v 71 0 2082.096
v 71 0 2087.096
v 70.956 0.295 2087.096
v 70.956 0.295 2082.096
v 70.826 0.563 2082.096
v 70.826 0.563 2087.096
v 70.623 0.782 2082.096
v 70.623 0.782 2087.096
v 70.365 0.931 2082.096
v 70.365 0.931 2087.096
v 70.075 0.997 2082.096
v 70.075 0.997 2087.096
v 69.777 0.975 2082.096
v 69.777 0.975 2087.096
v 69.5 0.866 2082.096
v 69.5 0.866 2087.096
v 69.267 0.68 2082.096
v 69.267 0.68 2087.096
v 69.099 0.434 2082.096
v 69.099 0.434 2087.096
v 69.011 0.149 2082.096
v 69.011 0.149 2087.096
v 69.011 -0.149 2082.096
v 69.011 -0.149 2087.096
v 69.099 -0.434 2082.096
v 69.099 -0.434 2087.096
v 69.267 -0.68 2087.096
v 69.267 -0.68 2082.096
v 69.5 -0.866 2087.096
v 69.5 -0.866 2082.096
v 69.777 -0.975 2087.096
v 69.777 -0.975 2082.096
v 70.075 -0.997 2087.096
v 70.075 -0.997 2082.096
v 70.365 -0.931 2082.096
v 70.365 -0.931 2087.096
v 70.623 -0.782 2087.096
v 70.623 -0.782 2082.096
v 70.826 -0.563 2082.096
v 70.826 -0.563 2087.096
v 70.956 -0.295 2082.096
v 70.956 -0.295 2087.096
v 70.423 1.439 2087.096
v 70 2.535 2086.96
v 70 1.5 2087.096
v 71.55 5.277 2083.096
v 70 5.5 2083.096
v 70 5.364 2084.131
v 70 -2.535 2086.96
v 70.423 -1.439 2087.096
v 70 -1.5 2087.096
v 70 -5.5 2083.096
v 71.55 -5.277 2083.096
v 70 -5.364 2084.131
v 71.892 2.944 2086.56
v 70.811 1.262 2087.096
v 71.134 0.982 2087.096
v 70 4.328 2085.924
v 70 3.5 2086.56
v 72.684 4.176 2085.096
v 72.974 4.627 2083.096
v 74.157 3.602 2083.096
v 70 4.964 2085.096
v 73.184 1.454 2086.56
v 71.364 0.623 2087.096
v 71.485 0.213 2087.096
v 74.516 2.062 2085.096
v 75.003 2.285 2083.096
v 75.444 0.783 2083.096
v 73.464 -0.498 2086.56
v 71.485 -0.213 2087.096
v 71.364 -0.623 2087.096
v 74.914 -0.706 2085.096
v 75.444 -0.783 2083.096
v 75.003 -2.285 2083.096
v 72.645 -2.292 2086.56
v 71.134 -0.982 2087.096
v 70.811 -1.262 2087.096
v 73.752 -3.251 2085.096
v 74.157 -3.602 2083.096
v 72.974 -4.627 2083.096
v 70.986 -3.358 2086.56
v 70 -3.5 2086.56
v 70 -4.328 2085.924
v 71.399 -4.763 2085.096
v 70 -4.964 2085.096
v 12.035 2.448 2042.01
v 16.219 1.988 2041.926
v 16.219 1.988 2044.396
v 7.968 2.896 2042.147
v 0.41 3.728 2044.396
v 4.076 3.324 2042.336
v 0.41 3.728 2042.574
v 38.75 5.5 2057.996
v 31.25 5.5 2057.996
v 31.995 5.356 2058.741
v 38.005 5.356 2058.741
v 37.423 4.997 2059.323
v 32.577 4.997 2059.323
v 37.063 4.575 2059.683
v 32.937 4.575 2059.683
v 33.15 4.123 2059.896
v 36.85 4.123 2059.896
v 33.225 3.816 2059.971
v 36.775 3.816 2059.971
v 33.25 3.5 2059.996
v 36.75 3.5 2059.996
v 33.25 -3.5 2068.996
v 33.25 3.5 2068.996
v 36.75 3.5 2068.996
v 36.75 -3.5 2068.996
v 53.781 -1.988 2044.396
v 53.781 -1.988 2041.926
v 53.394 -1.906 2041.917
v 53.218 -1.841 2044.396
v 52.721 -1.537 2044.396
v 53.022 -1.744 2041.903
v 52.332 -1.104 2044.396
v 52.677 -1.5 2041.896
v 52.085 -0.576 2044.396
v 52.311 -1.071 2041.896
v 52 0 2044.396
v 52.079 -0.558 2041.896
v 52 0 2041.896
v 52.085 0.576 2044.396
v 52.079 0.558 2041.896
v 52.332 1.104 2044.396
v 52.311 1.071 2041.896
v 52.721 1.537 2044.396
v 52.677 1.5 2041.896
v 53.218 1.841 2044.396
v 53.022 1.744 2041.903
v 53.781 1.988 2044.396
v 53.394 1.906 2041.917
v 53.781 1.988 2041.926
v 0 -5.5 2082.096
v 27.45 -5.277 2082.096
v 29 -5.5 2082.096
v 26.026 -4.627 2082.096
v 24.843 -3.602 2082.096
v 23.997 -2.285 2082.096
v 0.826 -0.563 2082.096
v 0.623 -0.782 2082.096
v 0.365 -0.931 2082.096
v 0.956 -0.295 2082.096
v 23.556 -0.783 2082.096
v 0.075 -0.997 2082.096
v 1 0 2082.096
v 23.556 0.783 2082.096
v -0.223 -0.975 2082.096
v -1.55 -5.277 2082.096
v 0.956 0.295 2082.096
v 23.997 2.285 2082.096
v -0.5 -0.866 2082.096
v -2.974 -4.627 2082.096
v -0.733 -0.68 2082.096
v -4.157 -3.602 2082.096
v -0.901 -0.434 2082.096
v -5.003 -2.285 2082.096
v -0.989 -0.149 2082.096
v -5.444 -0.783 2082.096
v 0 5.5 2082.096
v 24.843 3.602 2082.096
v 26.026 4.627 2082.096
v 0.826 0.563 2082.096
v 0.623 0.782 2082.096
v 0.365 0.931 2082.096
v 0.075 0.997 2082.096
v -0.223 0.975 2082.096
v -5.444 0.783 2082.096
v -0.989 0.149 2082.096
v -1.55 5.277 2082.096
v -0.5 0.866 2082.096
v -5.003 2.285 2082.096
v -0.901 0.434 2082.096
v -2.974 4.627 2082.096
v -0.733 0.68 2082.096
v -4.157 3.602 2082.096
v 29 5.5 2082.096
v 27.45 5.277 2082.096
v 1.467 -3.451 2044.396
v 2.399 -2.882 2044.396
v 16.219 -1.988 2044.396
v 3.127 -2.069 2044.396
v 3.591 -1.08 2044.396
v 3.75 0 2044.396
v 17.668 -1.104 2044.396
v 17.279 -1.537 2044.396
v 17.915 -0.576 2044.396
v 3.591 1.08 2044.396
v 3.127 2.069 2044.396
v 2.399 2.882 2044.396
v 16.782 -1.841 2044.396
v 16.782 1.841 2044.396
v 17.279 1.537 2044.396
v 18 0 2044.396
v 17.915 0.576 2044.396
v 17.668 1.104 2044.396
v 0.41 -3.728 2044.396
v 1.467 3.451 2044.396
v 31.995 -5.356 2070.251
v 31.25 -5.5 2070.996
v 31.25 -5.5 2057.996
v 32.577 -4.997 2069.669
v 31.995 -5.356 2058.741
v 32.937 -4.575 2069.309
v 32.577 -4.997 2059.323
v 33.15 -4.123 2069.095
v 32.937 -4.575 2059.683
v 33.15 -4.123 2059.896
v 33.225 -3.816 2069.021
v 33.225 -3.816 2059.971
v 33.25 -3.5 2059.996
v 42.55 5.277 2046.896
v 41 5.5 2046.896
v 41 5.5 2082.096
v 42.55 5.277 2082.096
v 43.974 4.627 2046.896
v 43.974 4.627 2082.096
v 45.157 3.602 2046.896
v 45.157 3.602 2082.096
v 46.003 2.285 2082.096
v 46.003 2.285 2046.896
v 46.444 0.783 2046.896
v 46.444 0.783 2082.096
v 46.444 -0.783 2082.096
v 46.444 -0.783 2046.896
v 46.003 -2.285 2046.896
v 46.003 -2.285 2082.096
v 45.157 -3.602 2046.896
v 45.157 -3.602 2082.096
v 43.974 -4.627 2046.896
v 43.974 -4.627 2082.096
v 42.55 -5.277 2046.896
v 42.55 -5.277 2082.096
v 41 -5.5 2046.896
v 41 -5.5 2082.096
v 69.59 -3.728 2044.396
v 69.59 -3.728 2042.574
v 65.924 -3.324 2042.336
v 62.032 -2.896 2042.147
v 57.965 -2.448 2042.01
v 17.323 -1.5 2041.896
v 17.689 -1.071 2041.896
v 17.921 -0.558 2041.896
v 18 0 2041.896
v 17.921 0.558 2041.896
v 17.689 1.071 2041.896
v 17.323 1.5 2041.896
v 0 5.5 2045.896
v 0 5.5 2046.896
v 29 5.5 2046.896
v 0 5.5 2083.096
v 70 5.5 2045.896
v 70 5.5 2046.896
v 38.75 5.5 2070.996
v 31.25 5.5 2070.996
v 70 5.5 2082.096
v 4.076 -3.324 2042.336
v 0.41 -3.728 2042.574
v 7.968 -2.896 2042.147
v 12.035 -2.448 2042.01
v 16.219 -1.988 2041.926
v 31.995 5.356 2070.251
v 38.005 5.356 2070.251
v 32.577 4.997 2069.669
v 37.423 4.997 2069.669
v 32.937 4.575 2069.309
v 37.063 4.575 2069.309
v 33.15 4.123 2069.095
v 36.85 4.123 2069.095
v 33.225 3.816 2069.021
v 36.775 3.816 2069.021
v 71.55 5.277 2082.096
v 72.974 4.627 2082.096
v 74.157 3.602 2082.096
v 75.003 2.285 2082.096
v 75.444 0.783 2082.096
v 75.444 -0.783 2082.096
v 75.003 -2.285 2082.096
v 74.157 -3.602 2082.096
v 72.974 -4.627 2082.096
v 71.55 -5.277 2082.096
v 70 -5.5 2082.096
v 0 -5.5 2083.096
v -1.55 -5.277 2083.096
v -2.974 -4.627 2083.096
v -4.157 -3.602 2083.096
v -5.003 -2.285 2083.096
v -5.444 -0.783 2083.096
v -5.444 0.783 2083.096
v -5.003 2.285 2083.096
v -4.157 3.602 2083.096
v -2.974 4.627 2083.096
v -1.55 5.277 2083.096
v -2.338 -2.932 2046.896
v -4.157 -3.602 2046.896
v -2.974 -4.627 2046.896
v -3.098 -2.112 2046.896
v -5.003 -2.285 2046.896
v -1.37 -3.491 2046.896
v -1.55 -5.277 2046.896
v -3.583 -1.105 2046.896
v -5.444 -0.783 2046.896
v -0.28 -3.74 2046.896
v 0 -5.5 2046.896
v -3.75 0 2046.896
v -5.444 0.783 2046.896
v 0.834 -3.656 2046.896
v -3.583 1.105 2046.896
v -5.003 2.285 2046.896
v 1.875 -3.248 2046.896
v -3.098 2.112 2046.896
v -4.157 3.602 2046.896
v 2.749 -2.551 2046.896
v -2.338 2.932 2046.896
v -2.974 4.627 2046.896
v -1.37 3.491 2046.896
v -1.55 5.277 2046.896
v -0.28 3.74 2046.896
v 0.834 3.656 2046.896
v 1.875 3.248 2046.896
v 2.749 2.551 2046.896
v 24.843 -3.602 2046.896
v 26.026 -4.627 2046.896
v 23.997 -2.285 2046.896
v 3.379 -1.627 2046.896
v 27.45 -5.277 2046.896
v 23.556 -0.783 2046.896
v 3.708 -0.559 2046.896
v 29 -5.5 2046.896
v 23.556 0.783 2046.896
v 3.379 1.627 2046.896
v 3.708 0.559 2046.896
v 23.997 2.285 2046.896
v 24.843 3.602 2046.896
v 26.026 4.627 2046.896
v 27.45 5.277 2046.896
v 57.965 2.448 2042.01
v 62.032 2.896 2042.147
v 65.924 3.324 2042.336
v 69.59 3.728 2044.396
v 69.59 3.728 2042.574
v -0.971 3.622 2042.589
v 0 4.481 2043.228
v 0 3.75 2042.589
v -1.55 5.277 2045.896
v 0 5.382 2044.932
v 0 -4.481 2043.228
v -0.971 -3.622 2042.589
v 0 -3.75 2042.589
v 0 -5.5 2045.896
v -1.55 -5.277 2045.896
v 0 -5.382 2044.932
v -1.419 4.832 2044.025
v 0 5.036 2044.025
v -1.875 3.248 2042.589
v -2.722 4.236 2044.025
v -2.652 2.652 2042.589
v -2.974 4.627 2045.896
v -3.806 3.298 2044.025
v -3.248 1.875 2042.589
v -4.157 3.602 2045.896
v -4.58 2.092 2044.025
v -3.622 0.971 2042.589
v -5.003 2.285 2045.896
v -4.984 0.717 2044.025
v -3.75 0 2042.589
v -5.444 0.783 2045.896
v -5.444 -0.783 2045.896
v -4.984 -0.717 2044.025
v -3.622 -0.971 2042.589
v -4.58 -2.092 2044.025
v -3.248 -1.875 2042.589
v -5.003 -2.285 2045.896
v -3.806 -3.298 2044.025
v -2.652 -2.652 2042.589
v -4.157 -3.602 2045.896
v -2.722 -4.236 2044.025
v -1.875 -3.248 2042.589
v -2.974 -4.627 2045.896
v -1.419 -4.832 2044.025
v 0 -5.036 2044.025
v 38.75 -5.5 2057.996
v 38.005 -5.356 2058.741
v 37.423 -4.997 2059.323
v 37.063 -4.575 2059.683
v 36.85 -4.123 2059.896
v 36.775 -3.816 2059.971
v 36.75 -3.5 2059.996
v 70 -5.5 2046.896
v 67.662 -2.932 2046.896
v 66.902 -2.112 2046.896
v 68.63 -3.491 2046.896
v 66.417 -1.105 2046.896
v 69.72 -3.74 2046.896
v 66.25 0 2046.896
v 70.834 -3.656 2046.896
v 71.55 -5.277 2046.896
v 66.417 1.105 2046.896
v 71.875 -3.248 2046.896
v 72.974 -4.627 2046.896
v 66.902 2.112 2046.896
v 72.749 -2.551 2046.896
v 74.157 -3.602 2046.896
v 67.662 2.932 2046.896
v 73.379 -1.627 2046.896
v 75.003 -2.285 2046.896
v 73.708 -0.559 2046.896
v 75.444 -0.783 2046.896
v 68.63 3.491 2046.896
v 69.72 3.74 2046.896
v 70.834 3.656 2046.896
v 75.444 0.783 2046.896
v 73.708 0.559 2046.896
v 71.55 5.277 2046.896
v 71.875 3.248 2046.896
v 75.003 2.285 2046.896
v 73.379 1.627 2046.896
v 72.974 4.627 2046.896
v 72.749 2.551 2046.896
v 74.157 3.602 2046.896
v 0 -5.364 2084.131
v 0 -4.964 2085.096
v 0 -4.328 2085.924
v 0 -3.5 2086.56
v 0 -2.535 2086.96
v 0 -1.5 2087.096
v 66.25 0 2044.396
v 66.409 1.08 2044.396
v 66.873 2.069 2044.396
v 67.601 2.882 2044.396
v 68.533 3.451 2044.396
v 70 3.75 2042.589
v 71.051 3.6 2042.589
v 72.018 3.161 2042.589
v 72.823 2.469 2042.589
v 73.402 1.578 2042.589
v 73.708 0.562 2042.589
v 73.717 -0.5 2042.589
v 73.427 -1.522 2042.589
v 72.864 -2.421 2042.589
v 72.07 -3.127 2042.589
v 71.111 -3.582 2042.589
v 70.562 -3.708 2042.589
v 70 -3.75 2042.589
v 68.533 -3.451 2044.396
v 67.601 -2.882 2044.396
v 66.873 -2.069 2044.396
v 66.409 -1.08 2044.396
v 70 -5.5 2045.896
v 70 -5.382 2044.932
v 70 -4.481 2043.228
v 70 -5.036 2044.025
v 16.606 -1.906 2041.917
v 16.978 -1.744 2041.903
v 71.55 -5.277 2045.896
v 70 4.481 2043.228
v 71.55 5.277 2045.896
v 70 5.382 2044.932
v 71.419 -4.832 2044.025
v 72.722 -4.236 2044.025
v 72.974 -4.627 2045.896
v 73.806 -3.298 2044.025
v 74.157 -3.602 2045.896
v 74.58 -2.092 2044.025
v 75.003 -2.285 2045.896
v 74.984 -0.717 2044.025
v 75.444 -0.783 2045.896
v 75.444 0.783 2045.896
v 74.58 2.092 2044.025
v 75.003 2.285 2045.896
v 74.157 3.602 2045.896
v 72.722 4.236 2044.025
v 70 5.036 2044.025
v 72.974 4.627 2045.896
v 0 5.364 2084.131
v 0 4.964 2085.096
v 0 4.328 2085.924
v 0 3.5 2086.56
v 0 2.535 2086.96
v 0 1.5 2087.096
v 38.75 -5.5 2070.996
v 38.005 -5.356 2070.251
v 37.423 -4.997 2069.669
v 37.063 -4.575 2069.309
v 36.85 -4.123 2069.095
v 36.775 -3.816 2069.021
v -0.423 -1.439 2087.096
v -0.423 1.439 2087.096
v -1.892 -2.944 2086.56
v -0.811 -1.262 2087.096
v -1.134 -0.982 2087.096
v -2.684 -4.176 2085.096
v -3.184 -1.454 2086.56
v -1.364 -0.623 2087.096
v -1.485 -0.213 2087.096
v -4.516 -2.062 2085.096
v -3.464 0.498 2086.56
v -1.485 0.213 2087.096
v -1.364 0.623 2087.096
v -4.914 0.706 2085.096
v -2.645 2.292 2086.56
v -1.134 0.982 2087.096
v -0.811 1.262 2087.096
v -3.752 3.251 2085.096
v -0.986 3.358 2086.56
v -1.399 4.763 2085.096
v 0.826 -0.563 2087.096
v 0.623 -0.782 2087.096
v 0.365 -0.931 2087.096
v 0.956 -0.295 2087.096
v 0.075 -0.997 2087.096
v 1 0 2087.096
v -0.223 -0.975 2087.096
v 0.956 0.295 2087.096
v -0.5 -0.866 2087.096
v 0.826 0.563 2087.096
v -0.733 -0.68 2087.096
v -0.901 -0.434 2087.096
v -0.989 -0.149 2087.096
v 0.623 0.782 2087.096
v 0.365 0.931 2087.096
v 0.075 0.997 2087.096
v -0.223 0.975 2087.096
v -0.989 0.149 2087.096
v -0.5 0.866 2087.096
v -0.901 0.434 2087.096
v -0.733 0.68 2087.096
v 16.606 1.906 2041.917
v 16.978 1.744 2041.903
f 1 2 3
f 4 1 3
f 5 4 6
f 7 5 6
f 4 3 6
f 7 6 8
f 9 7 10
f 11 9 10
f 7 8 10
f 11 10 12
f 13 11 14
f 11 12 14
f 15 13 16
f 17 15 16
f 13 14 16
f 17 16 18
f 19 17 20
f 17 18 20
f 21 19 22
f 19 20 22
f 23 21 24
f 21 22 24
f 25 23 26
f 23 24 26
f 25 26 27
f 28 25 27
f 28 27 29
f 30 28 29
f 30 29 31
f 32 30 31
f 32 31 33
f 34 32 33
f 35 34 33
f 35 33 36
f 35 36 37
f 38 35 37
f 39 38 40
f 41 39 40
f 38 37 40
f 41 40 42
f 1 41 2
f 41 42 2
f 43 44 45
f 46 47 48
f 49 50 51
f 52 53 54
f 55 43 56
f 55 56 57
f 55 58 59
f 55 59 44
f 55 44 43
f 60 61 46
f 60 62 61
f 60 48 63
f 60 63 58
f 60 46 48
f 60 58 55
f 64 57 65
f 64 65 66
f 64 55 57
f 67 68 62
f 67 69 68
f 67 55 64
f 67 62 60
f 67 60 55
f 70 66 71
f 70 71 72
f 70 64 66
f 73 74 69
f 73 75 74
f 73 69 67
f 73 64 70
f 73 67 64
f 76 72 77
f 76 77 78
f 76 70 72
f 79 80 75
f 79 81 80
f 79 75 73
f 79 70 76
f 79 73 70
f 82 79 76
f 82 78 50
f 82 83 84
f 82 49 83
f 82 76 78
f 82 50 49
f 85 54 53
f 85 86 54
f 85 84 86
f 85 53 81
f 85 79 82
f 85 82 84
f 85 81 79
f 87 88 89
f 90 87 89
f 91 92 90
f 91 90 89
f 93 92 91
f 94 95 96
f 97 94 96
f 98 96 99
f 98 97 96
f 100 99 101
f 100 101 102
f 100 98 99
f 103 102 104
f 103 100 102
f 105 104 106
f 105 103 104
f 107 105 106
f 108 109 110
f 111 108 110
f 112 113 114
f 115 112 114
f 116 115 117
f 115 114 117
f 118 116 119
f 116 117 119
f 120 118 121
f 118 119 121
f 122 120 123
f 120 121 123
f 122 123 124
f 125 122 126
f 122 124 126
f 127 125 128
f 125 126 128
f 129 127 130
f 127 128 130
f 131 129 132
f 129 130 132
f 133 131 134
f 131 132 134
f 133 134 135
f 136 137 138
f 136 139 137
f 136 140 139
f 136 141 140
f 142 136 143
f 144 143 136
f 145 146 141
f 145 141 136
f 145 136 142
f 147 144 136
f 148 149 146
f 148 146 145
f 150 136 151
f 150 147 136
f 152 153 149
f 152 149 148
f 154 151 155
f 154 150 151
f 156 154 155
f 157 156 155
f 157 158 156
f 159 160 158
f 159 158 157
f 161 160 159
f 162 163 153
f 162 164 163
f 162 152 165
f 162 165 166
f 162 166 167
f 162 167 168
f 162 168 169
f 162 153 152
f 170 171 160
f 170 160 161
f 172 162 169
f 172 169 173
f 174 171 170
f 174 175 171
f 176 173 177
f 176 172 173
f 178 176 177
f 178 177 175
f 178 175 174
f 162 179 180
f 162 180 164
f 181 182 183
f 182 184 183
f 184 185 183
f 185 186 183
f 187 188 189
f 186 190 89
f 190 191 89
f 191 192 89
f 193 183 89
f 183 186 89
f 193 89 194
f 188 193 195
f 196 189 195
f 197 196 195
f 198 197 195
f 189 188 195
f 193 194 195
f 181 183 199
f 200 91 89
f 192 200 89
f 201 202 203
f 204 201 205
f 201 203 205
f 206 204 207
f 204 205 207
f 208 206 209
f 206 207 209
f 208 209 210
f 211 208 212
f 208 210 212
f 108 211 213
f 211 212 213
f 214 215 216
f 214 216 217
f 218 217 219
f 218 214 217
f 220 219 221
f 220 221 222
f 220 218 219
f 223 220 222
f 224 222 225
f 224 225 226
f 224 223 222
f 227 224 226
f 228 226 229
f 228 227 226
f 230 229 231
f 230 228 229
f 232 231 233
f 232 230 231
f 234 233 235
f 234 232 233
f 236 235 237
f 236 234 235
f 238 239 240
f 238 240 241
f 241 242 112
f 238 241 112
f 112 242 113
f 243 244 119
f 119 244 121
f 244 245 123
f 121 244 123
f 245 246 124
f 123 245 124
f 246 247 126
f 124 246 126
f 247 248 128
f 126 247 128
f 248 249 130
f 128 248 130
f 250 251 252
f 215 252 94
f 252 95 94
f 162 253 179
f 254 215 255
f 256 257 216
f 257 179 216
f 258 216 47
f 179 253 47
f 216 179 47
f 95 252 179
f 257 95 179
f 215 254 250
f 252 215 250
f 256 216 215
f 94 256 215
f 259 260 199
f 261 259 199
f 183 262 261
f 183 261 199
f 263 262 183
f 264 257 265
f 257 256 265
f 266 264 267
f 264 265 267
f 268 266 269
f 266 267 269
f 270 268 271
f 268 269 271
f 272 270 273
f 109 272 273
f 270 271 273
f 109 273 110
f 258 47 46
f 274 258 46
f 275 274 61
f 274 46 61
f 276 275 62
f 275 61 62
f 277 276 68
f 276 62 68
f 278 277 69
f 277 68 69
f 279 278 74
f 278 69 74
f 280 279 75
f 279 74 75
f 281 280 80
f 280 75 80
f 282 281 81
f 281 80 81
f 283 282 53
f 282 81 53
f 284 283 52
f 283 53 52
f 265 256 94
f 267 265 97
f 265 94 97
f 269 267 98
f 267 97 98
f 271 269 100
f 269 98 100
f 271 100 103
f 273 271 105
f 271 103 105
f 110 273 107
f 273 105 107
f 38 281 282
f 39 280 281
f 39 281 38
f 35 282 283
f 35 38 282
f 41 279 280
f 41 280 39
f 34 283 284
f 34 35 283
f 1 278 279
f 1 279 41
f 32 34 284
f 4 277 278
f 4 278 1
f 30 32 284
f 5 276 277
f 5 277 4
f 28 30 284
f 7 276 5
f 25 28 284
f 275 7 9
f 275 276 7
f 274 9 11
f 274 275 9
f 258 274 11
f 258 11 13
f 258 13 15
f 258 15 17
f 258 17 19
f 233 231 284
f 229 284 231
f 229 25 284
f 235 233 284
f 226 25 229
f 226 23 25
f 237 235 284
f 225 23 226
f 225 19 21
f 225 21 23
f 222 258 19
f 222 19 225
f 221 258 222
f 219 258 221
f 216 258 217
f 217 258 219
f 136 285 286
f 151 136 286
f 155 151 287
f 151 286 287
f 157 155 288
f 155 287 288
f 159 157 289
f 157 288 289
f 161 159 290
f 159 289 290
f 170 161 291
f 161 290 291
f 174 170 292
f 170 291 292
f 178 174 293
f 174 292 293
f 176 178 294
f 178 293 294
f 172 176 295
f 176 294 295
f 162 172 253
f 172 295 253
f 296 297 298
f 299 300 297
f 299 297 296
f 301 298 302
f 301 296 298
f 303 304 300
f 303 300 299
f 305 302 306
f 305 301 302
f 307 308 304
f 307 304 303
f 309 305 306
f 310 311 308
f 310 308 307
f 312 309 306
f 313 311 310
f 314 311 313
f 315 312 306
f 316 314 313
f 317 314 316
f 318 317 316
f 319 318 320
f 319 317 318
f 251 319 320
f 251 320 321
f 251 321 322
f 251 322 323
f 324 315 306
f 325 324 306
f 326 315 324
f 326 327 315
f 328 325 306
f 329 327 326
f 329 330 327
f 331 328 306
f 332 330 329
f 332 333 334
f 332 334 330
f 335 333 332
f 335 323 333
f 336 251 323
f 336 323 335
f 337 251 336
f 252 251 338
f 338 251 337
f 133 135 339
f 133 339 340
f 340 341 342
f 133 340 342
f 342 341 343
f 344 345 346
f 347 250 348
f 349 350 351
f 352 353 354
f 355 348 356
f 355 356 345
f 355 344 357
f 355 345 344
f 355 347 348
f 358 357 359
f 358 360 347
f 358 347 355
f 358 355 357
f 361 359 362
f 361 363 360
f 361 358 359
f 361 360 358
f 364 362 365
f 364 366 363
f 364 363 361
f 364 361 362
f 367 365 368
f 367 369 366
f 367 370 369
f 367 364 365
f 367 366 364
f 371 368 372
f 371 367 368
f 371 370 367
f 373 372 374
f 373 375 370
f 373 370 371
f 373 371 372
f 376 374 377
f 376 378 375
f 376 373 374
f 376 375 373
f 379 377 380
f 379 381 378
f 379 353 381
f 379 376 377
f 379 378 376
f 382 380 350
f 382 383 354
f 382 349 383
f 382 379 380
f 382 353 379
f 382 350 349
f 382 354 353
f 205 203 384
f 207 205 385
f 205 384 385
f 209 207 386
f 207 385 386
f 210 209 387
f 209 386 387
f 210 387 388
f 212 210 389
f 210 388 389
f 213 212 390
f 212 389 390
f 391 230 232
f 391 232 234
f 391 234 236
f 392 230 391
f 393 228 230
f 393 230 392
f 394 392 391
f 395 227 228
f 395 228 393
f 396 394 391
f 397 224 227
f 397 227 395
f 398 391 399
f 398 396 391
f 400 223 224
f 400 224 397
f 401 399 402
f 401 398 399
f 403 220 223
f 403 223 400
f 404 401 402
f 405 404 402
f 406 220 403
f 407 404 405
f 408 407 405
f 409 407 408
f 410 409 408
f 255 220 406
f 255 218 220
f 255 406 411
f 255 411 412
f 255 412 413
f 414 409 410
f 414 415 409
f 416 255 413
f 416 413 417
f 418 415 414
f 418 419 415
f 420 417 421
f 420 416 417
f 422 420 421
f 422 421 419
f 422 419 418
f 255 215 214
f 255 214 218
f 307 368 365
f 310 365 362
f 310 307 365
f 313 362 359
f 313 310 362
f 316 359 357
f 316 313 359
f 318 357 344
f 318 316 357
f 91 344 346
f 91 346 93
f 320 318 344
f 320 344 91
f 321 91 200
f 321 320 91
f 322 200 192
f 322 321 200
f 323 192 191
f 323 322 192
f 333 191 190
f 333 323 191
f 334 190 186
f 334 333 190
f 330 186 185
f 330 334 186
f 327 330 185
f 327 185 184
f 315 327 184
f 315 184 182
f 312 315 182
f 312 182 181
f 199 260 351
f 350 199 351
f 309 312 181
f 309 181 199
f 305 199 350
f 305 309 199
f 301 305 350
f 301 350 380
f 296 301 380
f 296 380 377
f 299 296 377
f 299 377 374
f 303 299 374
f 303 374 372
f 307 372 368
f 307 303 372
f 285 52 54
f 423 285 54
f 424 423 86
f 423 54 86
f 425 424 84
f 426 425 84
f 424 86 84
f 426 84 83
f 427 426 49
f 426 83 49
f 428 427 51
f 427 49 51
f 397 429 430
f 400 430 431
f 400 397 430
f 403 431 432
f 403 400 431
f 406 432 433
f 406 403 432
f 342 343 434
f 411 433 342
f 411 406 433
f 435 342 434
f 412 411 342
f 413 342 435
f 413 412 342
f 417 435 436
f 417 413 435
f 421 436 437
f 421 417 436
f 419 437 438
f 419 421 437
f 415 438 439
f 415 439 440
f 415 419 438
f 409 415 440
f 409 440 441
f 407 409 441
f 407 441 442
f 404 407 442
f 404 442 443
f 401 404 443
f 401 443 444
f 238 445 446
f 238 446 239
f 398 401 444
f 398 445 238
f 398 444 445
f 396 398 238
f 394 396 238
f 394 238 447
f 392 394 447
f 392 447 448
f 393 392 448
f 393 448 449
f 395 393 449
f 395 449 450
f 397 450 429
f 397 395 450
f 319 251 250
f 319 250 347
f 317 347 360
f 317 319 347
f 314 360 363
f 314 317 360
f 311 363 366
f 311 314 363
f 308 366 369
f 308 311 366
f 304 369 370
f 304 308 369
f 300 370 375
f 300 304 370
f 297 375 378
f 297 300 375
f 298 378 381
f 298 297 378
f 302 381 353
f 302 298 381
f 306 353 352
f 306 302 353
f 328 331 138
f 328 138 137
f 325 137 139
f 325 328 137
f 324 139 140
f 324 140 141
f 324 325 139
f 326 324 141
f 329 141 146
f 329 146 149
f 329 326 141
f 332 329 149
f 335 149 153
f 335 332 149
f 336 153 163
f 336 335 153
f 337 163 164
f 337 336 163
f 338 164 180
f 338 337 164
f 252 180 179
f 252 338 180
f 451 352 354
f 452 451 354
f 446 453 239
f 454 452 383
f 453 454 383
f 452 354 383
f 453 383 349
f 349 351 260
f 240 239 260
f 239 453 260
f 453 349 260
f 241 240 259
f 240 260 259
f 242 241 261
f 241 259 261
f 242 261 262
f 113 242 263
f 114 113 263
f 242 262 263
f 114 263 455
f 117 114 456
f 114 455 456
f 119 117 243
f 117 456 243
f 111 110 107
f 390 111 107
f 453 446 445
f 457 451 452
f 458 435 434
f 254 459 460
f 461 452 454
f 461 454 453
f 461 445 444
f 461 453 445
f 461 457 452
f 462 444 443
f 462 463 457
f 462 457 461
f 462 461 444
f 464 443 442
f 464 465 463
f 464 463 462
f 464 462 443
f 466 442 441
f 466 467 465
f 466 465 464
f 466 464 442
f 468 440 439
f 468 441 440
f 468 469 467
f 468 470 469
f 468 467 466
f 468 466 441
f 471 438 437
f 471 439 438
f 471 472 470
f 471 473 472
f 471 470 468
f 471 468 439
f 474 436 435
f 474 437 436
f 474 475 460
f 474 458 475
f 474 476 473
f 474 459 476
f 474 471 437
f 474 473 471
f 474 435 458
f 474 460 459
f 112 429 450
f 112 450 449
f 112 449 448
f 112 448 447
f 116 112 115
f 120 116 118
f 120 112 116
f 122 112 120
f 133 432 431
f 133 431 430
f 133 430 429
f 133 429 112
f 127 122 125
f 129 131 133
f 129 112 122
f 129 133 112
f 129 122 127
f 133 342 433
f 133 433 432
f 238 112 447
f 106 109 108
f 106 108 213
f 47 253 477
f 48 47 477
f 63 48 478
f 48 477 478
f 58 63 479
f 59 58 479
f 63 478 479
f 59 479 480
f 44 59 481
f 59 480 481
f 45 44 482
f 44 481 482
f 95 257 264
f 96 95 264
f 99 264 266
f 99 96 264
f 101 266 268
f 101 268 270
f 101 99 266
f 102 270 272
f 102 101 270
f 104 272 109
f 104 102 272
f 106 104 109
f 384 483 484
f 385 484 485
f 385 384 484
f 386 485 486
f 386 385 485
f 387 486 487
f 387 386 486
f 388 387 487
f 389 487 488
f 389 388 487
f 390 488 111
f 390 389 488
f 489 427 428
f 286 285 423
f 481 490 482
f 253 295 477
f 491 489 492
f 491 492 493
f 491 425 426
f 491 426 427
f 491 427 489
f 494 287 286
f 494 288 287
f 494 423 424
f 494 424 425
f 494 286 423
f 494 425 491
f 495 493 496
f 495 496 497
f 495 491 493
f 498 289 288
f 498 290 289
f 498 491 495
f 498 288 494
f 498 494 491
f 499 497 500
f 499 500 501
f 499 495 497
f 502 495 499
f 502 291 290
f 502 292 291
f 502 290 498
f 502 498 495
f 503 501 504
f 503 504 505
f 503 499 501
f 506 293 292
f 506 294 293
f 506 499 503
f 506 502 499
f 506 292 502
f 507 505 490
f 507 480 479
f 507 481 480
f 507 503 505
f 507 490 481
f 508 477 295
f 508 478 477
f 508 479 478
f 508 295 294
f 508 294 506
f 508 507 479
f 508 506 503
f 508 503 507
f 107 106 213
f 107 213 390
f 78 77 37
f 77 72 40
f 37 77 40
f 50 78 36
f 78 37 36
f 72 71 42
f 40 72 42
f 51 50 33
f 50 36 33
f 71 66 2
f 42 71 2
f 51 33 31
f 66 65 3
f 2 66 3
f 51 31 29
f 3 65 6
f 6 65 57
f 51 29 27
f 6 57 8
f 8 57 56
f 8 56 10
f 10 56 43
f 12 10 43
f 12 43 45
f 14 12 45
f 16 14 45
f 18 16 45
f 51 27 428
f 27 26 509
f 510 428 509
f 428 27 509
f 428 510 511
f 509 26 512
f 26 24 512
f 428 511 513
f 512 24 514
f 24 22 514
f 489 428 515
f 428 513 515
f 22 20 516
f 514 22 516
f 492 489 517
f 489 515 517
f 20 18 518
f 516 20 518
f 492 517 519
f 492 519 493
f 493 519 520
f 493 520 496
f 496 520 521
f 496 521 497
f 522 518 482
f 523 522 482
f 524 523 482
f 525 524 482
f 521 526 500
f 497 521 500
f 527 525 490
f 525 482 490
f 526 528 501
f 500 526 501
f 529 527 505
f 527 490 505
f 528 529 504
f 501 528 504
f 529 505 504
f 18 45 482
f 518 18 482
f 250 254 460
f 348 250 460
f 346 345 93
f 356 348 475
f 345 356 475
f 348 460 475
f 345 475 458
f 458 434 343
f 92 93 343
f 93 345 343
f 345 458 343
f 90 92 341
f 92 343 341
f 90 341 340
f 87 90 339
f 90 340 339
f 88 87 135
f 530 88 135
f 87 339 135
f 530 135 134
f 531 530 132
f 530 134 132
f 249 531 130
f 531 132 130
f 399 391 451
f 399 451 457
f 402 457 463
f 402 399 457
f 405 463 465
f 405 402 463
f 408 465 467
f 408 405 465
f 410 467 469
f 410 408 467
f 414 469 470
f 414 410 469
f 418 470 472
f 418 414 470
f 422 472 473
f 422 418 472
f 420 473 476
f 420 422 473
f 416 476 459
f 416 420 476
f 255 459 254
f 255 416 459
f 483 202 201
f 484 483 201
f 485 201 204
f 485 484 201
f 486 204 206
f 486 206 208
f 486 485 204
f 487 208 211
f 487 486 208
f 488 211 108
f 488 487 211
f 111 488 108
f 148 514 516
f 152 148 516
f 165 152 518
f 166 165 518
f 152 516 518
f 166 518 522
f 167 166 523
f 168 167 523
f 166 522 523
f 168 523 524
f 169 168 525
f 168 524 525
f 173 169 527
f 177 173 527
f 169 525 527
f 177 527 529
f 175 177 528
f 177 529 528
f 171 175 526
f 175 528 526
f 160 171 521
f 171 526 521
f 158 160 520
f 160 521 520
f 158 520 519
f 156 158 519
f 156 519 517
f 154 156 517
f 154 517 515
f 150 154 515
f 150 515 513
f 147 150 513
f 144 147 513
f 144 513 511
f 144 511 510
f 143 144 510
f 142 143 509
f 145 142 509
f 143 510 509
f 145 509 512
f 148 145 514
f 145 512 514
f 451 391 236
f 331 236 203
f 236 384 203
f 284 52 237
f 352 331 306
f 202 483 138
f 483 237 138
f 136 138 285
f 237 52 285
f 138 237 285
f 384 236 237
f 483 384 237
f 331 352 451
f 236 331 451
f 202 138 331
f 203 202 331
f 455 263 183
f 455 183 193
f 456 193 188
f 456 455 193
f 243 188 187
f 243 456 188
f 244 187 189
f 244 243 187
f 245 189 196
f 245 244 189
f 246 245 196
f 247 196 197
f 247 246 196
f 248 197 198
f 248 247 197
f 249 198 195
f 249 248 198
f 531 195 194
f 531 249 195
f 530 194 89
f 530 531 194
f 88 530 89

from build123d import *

# Parameters (mm, degrees)
BOSS_EXTRU_1_DEPTH      = 1
BOSS_EXTRU_1_DEPTH_BACK = 4
ESQUISSE1_R             = 3.75
ENL_V_MAT_EXTRU_1_DEPTH = 2.5
BOSS_EXTRU_2_DEPTH      = 35.2
BOSS_EXTRU_3_START      = 5
BOSS_EXTRU_3_DEPTH      = 5
ESQUISSE5_R             = 1
ENL_V_MAT_EXTRU_2_DEPTH = 5
CONG_1_R                = 4
ESQUISSE6_W             = 3.5
ESQUISSE6_H             = 9
ENL_V_MAT_EXTRU_3_DEPTH = 2089.490019804
CONG_2_R                = 2


with BuildPart() as part:
    # Esquisse1 → Boss.-Extru.1 (new, two sides: drawn at the far end of the back side and taken through both)
    with BuildSketch(Plane(origin=(0, 0, 2042.895904074), x_dir=(-1, 0, 0), z_dir=(0, 0, -1)).offset(-BOSS_EXTRU_1_DEPTH_BACK)):
        with BuildLine():
            Line((0, -5.5), (-70, -5.5))
            ThreePointArc((-70, -5.5), (-75.5, 0), (-70, 5.5))
            Line((-70, 5.5), (0, 5.5))
            ThreePointArc((0, 5.5), (5.5, 0), (0, -5.5))
        make_face()
        Circle(ESQUISSE1_R, mode=Mode.SUBTRACT)
        with Locations((-70, 0)):
            Circle(ESQUISSE1_R, mode=Mode.SUBTRACT)
    extrude(amount=BOSS_EXTRU_1_DEPTH + BOSS_EXTRU_1_DEPTH_BACK)

    # Esquisse2 → Enlèv. mat.-Extru.1 (cut)
    with BuildSketch(Plane(origin=(0, 0, 2041.895904074), x_dir=(-1, 0, 0), z_dir=(0, 0, -1))):
        with BuildLine():
            Line((-0.41015625, -3.727502093), (-16.21875, -1.988001116))
            ThreePointArc((-16.21875, -1.988001116), (-18, 0), (-16.21875, 1.988001116))
            Line((-16.21875, 1.988001116), (-0.41015625, 3.727502093))
            Line((-0.41015625, 3.727502093), (-0.41015625, -3.727502093))
        make_face()
        with BuildLine():
            Line((-53.78125, 1.988001116), (-69.58984375, 3.727502093))
            Line((-69.58984375, 3.727502093), (-69.58984375, -3.727502093))
            Line((-69.58984375, -3.727502093), (-53.78125, -1.988001116))
            ThreePointArc((-53.78125, -1.988001116), (-52, 0), (-53.78125, 1.988001116))
        make_face()
    extrude(amount=-ENL_V_MAT_EXTRU_1_DEPTH, mode=Mode.SUBTRACT)

    # Esquisse3 → Boss.-Extru.2 (add)
    with BuildSketch(Plane.XY.offset(2046.895904074)):
        with BuildLine():
            Line((29, 5.5), (41, 5.5))
            ThreePointArc((41, 5.5), (46.5, 0), (41, -5.5))
            Line((41, -5.5), (29, -5.5))
            ThreePointArc((29, -5.5), (23.5, 0), (29, 5.5))
        make_face()
    extrude(amount=BOSS_EXTRU_2_DEPTH)

    # Esquisse4 → Boss.-Extru.3 (add)
    with BuildSketch(Plane.XY.offset(2082.095904074).offset(BOSS_EXTRU_3_START)):
        with BuildLine():
            Line((0, 5.5), (70, 5.5))
            ThreePointArc((70, 5.5), (75.5, 0), (70, -5.5))
            Line((70, -5.5), (0, -5.5))
            ThreePointArc((0, -5.5), (-5.5, 0), (0, 5.5))
        make_face()
    extrude(amount=-BOSS_EXTRU_3_DEPTH)

    # Esquisse5 → Enlèv. mat.-Extru.2 (cut)
    with BuildSketch(Plane.XY.offset(2087.095904074)):
        Circle(ESQUISSE5_R)
        with Locations((70, 0)):
            Circle(ESQUISSE5_R)
    extrude(amount=-ENL_V_MAT_EXTRU_2_DEPTH, mode=Mode.SUBTRACT)

    # Congé1
    # the kernel refuses this fillet: 4 mm, written as the material it takes off along each edge
    with BuildSketch(Plane(origin=(70, 5.5, 2041.895904074), x_dir=(0, 0, 1), z_dir=(-1, 0, 0)), Plane(origin=(0, -5.5, 2041.895904074), x_dir=(0, 0, 1), z_dir=(1, 0, 0)), Plane(origin=(70, -5.5, 2087.095904074), x_dir=(0, 0, -1), z_dir=(-1, 0, 0)), Plane(origin=(0, 5.5, 2087.095904074), x_dir=(0, 0, -1), z_dir=(1, 0, 0))) as cong_1_piece_1:
        with BuildLine():
            CenterArc((CONG_1_R, -CONG_1_R), CONG_1_R, 90, 90)
            Line((0, -CONG_1_R), (0, 0))
            Line((0, 0), (CONG_1_R, 0))
        make_face()
    extrude(amount=70, mode=Mode.SUBTRACT)
    with BuildSketch(Plane(origin=(70, 0, 2087.095904074), x_dir=(0, 1, 0), z_dir=(-1, 0, 0))) as cong_1_piece_2:
        with BuildLine():
            CenterArc((5.5 - CONG_1_R, CONG_1_R), CONG_1_R, 270, 90)
            Line((5.5, CONG_1_R), (5.5, 0))
            Line((5.5, 0), (5.5 - CONG_1_R, 0))
        make_face()
    revolve(axis=Axis((70, 0, 2087.095904074), (0, 0, -1)), revolution_arc=180, mode=Mode.SUBTRACT)
    with BuildSketch(Plane(origin=(0, 0, 2087.095904074), x_dir=(0, -1, 0), z_dir=(1, 0, 0))) as cong_1_piece_3:
        with BuildLine():
            CenterArc((5.5 - CONG_1_R, CONG_1_R), CONG_1_R, 270, 90)
            Line((5.5 - CONG_1_R, 0), (5.5, 0))
            Line((5.5, 0), (5.5, CONG_1_R))
        make_face()
    revolve(axis=Axis((0, 0, 2087.095904074), (0, 0, -1)), revolution_arc=180, mode=Mode.SUBTRACT)
    with BuildSketch(Plane(origin=(0, 0, 2041.895904074), x_dir=(0, 1, 0), z_dir=(1, 0, 0))) as cong_1_piece_4:
        with BuildLine():
            CenterArc((5.5 - CONG_1_R, CONG_1_R), CONG_1_R, 270, 90)
            Line((5.5, CONG_1_R), (5.5, 0))
            Line((5.5, 0), (5.5 - CONG_1_R, 0))
        make_face()
    revolve(axis=Axis((0, 0, 2041.895904074), (0, 0, 1)), revolution_arc=180, mode=Mode.SUBTRACT)
    with BuildSketch(Plane(origin=(70, 0, 2041.895904074), x_dir=(0, -1, 0), z_dir=(-1, 0, 0))) as cong_1_piece_5:
        with BuildLine():
            CenterArc((5.5 - CONG_1_R, CONG_1_R), CONG_1_R, 270, 90)
            Line((5.5 - CONG_1_R, 0), (5.5, 0))
            Line((5.5, 0), (5.5, CONG_1_R))
        make_face()
    revolve(axis=Axis((70, 0, 2041.895904074), (0, 0, 1)), revolution_arc=180, mode=Mode.SUBTRACT)

    # Esquisse6 → Enlèv. mat.-Extru.3 (cut, through all)
    with BuildSketch(Plane(origin=(0, 5.5, 0), x_dir=(1, 0, 0), z_dir=(0, 1, 0))):
        with Locations((35, -2064.495904074)):
            Rectangle(ESQUISSE6_W, ESQUISSE6_H)
    extrude(amount=-ENL_V_MAT_EXTRU_3_DEPTH, mode=Mode.SUBTRACT)

    # Congé2
    cong_2_edges = [part.edges().sort_by_distance(p)[0] for p in [
        (36.75, -5.5, 2064.495904074),
        (35, -5.5, 2068.995904074),
        (33.25, -5.5, 2064.495904074),
        (35, -5.5, 2059.995904074),
        (36.75, 5.5, 2064.495904074),
        (35, 5.5, 2059.995904074),
        (33.25, 5.5, 2064.495904074),
        (35, 5.5, 2068.995904074),
    ]]
    fillet(cong_2_edges, radius=CONG_2_R)


solid = part.part
